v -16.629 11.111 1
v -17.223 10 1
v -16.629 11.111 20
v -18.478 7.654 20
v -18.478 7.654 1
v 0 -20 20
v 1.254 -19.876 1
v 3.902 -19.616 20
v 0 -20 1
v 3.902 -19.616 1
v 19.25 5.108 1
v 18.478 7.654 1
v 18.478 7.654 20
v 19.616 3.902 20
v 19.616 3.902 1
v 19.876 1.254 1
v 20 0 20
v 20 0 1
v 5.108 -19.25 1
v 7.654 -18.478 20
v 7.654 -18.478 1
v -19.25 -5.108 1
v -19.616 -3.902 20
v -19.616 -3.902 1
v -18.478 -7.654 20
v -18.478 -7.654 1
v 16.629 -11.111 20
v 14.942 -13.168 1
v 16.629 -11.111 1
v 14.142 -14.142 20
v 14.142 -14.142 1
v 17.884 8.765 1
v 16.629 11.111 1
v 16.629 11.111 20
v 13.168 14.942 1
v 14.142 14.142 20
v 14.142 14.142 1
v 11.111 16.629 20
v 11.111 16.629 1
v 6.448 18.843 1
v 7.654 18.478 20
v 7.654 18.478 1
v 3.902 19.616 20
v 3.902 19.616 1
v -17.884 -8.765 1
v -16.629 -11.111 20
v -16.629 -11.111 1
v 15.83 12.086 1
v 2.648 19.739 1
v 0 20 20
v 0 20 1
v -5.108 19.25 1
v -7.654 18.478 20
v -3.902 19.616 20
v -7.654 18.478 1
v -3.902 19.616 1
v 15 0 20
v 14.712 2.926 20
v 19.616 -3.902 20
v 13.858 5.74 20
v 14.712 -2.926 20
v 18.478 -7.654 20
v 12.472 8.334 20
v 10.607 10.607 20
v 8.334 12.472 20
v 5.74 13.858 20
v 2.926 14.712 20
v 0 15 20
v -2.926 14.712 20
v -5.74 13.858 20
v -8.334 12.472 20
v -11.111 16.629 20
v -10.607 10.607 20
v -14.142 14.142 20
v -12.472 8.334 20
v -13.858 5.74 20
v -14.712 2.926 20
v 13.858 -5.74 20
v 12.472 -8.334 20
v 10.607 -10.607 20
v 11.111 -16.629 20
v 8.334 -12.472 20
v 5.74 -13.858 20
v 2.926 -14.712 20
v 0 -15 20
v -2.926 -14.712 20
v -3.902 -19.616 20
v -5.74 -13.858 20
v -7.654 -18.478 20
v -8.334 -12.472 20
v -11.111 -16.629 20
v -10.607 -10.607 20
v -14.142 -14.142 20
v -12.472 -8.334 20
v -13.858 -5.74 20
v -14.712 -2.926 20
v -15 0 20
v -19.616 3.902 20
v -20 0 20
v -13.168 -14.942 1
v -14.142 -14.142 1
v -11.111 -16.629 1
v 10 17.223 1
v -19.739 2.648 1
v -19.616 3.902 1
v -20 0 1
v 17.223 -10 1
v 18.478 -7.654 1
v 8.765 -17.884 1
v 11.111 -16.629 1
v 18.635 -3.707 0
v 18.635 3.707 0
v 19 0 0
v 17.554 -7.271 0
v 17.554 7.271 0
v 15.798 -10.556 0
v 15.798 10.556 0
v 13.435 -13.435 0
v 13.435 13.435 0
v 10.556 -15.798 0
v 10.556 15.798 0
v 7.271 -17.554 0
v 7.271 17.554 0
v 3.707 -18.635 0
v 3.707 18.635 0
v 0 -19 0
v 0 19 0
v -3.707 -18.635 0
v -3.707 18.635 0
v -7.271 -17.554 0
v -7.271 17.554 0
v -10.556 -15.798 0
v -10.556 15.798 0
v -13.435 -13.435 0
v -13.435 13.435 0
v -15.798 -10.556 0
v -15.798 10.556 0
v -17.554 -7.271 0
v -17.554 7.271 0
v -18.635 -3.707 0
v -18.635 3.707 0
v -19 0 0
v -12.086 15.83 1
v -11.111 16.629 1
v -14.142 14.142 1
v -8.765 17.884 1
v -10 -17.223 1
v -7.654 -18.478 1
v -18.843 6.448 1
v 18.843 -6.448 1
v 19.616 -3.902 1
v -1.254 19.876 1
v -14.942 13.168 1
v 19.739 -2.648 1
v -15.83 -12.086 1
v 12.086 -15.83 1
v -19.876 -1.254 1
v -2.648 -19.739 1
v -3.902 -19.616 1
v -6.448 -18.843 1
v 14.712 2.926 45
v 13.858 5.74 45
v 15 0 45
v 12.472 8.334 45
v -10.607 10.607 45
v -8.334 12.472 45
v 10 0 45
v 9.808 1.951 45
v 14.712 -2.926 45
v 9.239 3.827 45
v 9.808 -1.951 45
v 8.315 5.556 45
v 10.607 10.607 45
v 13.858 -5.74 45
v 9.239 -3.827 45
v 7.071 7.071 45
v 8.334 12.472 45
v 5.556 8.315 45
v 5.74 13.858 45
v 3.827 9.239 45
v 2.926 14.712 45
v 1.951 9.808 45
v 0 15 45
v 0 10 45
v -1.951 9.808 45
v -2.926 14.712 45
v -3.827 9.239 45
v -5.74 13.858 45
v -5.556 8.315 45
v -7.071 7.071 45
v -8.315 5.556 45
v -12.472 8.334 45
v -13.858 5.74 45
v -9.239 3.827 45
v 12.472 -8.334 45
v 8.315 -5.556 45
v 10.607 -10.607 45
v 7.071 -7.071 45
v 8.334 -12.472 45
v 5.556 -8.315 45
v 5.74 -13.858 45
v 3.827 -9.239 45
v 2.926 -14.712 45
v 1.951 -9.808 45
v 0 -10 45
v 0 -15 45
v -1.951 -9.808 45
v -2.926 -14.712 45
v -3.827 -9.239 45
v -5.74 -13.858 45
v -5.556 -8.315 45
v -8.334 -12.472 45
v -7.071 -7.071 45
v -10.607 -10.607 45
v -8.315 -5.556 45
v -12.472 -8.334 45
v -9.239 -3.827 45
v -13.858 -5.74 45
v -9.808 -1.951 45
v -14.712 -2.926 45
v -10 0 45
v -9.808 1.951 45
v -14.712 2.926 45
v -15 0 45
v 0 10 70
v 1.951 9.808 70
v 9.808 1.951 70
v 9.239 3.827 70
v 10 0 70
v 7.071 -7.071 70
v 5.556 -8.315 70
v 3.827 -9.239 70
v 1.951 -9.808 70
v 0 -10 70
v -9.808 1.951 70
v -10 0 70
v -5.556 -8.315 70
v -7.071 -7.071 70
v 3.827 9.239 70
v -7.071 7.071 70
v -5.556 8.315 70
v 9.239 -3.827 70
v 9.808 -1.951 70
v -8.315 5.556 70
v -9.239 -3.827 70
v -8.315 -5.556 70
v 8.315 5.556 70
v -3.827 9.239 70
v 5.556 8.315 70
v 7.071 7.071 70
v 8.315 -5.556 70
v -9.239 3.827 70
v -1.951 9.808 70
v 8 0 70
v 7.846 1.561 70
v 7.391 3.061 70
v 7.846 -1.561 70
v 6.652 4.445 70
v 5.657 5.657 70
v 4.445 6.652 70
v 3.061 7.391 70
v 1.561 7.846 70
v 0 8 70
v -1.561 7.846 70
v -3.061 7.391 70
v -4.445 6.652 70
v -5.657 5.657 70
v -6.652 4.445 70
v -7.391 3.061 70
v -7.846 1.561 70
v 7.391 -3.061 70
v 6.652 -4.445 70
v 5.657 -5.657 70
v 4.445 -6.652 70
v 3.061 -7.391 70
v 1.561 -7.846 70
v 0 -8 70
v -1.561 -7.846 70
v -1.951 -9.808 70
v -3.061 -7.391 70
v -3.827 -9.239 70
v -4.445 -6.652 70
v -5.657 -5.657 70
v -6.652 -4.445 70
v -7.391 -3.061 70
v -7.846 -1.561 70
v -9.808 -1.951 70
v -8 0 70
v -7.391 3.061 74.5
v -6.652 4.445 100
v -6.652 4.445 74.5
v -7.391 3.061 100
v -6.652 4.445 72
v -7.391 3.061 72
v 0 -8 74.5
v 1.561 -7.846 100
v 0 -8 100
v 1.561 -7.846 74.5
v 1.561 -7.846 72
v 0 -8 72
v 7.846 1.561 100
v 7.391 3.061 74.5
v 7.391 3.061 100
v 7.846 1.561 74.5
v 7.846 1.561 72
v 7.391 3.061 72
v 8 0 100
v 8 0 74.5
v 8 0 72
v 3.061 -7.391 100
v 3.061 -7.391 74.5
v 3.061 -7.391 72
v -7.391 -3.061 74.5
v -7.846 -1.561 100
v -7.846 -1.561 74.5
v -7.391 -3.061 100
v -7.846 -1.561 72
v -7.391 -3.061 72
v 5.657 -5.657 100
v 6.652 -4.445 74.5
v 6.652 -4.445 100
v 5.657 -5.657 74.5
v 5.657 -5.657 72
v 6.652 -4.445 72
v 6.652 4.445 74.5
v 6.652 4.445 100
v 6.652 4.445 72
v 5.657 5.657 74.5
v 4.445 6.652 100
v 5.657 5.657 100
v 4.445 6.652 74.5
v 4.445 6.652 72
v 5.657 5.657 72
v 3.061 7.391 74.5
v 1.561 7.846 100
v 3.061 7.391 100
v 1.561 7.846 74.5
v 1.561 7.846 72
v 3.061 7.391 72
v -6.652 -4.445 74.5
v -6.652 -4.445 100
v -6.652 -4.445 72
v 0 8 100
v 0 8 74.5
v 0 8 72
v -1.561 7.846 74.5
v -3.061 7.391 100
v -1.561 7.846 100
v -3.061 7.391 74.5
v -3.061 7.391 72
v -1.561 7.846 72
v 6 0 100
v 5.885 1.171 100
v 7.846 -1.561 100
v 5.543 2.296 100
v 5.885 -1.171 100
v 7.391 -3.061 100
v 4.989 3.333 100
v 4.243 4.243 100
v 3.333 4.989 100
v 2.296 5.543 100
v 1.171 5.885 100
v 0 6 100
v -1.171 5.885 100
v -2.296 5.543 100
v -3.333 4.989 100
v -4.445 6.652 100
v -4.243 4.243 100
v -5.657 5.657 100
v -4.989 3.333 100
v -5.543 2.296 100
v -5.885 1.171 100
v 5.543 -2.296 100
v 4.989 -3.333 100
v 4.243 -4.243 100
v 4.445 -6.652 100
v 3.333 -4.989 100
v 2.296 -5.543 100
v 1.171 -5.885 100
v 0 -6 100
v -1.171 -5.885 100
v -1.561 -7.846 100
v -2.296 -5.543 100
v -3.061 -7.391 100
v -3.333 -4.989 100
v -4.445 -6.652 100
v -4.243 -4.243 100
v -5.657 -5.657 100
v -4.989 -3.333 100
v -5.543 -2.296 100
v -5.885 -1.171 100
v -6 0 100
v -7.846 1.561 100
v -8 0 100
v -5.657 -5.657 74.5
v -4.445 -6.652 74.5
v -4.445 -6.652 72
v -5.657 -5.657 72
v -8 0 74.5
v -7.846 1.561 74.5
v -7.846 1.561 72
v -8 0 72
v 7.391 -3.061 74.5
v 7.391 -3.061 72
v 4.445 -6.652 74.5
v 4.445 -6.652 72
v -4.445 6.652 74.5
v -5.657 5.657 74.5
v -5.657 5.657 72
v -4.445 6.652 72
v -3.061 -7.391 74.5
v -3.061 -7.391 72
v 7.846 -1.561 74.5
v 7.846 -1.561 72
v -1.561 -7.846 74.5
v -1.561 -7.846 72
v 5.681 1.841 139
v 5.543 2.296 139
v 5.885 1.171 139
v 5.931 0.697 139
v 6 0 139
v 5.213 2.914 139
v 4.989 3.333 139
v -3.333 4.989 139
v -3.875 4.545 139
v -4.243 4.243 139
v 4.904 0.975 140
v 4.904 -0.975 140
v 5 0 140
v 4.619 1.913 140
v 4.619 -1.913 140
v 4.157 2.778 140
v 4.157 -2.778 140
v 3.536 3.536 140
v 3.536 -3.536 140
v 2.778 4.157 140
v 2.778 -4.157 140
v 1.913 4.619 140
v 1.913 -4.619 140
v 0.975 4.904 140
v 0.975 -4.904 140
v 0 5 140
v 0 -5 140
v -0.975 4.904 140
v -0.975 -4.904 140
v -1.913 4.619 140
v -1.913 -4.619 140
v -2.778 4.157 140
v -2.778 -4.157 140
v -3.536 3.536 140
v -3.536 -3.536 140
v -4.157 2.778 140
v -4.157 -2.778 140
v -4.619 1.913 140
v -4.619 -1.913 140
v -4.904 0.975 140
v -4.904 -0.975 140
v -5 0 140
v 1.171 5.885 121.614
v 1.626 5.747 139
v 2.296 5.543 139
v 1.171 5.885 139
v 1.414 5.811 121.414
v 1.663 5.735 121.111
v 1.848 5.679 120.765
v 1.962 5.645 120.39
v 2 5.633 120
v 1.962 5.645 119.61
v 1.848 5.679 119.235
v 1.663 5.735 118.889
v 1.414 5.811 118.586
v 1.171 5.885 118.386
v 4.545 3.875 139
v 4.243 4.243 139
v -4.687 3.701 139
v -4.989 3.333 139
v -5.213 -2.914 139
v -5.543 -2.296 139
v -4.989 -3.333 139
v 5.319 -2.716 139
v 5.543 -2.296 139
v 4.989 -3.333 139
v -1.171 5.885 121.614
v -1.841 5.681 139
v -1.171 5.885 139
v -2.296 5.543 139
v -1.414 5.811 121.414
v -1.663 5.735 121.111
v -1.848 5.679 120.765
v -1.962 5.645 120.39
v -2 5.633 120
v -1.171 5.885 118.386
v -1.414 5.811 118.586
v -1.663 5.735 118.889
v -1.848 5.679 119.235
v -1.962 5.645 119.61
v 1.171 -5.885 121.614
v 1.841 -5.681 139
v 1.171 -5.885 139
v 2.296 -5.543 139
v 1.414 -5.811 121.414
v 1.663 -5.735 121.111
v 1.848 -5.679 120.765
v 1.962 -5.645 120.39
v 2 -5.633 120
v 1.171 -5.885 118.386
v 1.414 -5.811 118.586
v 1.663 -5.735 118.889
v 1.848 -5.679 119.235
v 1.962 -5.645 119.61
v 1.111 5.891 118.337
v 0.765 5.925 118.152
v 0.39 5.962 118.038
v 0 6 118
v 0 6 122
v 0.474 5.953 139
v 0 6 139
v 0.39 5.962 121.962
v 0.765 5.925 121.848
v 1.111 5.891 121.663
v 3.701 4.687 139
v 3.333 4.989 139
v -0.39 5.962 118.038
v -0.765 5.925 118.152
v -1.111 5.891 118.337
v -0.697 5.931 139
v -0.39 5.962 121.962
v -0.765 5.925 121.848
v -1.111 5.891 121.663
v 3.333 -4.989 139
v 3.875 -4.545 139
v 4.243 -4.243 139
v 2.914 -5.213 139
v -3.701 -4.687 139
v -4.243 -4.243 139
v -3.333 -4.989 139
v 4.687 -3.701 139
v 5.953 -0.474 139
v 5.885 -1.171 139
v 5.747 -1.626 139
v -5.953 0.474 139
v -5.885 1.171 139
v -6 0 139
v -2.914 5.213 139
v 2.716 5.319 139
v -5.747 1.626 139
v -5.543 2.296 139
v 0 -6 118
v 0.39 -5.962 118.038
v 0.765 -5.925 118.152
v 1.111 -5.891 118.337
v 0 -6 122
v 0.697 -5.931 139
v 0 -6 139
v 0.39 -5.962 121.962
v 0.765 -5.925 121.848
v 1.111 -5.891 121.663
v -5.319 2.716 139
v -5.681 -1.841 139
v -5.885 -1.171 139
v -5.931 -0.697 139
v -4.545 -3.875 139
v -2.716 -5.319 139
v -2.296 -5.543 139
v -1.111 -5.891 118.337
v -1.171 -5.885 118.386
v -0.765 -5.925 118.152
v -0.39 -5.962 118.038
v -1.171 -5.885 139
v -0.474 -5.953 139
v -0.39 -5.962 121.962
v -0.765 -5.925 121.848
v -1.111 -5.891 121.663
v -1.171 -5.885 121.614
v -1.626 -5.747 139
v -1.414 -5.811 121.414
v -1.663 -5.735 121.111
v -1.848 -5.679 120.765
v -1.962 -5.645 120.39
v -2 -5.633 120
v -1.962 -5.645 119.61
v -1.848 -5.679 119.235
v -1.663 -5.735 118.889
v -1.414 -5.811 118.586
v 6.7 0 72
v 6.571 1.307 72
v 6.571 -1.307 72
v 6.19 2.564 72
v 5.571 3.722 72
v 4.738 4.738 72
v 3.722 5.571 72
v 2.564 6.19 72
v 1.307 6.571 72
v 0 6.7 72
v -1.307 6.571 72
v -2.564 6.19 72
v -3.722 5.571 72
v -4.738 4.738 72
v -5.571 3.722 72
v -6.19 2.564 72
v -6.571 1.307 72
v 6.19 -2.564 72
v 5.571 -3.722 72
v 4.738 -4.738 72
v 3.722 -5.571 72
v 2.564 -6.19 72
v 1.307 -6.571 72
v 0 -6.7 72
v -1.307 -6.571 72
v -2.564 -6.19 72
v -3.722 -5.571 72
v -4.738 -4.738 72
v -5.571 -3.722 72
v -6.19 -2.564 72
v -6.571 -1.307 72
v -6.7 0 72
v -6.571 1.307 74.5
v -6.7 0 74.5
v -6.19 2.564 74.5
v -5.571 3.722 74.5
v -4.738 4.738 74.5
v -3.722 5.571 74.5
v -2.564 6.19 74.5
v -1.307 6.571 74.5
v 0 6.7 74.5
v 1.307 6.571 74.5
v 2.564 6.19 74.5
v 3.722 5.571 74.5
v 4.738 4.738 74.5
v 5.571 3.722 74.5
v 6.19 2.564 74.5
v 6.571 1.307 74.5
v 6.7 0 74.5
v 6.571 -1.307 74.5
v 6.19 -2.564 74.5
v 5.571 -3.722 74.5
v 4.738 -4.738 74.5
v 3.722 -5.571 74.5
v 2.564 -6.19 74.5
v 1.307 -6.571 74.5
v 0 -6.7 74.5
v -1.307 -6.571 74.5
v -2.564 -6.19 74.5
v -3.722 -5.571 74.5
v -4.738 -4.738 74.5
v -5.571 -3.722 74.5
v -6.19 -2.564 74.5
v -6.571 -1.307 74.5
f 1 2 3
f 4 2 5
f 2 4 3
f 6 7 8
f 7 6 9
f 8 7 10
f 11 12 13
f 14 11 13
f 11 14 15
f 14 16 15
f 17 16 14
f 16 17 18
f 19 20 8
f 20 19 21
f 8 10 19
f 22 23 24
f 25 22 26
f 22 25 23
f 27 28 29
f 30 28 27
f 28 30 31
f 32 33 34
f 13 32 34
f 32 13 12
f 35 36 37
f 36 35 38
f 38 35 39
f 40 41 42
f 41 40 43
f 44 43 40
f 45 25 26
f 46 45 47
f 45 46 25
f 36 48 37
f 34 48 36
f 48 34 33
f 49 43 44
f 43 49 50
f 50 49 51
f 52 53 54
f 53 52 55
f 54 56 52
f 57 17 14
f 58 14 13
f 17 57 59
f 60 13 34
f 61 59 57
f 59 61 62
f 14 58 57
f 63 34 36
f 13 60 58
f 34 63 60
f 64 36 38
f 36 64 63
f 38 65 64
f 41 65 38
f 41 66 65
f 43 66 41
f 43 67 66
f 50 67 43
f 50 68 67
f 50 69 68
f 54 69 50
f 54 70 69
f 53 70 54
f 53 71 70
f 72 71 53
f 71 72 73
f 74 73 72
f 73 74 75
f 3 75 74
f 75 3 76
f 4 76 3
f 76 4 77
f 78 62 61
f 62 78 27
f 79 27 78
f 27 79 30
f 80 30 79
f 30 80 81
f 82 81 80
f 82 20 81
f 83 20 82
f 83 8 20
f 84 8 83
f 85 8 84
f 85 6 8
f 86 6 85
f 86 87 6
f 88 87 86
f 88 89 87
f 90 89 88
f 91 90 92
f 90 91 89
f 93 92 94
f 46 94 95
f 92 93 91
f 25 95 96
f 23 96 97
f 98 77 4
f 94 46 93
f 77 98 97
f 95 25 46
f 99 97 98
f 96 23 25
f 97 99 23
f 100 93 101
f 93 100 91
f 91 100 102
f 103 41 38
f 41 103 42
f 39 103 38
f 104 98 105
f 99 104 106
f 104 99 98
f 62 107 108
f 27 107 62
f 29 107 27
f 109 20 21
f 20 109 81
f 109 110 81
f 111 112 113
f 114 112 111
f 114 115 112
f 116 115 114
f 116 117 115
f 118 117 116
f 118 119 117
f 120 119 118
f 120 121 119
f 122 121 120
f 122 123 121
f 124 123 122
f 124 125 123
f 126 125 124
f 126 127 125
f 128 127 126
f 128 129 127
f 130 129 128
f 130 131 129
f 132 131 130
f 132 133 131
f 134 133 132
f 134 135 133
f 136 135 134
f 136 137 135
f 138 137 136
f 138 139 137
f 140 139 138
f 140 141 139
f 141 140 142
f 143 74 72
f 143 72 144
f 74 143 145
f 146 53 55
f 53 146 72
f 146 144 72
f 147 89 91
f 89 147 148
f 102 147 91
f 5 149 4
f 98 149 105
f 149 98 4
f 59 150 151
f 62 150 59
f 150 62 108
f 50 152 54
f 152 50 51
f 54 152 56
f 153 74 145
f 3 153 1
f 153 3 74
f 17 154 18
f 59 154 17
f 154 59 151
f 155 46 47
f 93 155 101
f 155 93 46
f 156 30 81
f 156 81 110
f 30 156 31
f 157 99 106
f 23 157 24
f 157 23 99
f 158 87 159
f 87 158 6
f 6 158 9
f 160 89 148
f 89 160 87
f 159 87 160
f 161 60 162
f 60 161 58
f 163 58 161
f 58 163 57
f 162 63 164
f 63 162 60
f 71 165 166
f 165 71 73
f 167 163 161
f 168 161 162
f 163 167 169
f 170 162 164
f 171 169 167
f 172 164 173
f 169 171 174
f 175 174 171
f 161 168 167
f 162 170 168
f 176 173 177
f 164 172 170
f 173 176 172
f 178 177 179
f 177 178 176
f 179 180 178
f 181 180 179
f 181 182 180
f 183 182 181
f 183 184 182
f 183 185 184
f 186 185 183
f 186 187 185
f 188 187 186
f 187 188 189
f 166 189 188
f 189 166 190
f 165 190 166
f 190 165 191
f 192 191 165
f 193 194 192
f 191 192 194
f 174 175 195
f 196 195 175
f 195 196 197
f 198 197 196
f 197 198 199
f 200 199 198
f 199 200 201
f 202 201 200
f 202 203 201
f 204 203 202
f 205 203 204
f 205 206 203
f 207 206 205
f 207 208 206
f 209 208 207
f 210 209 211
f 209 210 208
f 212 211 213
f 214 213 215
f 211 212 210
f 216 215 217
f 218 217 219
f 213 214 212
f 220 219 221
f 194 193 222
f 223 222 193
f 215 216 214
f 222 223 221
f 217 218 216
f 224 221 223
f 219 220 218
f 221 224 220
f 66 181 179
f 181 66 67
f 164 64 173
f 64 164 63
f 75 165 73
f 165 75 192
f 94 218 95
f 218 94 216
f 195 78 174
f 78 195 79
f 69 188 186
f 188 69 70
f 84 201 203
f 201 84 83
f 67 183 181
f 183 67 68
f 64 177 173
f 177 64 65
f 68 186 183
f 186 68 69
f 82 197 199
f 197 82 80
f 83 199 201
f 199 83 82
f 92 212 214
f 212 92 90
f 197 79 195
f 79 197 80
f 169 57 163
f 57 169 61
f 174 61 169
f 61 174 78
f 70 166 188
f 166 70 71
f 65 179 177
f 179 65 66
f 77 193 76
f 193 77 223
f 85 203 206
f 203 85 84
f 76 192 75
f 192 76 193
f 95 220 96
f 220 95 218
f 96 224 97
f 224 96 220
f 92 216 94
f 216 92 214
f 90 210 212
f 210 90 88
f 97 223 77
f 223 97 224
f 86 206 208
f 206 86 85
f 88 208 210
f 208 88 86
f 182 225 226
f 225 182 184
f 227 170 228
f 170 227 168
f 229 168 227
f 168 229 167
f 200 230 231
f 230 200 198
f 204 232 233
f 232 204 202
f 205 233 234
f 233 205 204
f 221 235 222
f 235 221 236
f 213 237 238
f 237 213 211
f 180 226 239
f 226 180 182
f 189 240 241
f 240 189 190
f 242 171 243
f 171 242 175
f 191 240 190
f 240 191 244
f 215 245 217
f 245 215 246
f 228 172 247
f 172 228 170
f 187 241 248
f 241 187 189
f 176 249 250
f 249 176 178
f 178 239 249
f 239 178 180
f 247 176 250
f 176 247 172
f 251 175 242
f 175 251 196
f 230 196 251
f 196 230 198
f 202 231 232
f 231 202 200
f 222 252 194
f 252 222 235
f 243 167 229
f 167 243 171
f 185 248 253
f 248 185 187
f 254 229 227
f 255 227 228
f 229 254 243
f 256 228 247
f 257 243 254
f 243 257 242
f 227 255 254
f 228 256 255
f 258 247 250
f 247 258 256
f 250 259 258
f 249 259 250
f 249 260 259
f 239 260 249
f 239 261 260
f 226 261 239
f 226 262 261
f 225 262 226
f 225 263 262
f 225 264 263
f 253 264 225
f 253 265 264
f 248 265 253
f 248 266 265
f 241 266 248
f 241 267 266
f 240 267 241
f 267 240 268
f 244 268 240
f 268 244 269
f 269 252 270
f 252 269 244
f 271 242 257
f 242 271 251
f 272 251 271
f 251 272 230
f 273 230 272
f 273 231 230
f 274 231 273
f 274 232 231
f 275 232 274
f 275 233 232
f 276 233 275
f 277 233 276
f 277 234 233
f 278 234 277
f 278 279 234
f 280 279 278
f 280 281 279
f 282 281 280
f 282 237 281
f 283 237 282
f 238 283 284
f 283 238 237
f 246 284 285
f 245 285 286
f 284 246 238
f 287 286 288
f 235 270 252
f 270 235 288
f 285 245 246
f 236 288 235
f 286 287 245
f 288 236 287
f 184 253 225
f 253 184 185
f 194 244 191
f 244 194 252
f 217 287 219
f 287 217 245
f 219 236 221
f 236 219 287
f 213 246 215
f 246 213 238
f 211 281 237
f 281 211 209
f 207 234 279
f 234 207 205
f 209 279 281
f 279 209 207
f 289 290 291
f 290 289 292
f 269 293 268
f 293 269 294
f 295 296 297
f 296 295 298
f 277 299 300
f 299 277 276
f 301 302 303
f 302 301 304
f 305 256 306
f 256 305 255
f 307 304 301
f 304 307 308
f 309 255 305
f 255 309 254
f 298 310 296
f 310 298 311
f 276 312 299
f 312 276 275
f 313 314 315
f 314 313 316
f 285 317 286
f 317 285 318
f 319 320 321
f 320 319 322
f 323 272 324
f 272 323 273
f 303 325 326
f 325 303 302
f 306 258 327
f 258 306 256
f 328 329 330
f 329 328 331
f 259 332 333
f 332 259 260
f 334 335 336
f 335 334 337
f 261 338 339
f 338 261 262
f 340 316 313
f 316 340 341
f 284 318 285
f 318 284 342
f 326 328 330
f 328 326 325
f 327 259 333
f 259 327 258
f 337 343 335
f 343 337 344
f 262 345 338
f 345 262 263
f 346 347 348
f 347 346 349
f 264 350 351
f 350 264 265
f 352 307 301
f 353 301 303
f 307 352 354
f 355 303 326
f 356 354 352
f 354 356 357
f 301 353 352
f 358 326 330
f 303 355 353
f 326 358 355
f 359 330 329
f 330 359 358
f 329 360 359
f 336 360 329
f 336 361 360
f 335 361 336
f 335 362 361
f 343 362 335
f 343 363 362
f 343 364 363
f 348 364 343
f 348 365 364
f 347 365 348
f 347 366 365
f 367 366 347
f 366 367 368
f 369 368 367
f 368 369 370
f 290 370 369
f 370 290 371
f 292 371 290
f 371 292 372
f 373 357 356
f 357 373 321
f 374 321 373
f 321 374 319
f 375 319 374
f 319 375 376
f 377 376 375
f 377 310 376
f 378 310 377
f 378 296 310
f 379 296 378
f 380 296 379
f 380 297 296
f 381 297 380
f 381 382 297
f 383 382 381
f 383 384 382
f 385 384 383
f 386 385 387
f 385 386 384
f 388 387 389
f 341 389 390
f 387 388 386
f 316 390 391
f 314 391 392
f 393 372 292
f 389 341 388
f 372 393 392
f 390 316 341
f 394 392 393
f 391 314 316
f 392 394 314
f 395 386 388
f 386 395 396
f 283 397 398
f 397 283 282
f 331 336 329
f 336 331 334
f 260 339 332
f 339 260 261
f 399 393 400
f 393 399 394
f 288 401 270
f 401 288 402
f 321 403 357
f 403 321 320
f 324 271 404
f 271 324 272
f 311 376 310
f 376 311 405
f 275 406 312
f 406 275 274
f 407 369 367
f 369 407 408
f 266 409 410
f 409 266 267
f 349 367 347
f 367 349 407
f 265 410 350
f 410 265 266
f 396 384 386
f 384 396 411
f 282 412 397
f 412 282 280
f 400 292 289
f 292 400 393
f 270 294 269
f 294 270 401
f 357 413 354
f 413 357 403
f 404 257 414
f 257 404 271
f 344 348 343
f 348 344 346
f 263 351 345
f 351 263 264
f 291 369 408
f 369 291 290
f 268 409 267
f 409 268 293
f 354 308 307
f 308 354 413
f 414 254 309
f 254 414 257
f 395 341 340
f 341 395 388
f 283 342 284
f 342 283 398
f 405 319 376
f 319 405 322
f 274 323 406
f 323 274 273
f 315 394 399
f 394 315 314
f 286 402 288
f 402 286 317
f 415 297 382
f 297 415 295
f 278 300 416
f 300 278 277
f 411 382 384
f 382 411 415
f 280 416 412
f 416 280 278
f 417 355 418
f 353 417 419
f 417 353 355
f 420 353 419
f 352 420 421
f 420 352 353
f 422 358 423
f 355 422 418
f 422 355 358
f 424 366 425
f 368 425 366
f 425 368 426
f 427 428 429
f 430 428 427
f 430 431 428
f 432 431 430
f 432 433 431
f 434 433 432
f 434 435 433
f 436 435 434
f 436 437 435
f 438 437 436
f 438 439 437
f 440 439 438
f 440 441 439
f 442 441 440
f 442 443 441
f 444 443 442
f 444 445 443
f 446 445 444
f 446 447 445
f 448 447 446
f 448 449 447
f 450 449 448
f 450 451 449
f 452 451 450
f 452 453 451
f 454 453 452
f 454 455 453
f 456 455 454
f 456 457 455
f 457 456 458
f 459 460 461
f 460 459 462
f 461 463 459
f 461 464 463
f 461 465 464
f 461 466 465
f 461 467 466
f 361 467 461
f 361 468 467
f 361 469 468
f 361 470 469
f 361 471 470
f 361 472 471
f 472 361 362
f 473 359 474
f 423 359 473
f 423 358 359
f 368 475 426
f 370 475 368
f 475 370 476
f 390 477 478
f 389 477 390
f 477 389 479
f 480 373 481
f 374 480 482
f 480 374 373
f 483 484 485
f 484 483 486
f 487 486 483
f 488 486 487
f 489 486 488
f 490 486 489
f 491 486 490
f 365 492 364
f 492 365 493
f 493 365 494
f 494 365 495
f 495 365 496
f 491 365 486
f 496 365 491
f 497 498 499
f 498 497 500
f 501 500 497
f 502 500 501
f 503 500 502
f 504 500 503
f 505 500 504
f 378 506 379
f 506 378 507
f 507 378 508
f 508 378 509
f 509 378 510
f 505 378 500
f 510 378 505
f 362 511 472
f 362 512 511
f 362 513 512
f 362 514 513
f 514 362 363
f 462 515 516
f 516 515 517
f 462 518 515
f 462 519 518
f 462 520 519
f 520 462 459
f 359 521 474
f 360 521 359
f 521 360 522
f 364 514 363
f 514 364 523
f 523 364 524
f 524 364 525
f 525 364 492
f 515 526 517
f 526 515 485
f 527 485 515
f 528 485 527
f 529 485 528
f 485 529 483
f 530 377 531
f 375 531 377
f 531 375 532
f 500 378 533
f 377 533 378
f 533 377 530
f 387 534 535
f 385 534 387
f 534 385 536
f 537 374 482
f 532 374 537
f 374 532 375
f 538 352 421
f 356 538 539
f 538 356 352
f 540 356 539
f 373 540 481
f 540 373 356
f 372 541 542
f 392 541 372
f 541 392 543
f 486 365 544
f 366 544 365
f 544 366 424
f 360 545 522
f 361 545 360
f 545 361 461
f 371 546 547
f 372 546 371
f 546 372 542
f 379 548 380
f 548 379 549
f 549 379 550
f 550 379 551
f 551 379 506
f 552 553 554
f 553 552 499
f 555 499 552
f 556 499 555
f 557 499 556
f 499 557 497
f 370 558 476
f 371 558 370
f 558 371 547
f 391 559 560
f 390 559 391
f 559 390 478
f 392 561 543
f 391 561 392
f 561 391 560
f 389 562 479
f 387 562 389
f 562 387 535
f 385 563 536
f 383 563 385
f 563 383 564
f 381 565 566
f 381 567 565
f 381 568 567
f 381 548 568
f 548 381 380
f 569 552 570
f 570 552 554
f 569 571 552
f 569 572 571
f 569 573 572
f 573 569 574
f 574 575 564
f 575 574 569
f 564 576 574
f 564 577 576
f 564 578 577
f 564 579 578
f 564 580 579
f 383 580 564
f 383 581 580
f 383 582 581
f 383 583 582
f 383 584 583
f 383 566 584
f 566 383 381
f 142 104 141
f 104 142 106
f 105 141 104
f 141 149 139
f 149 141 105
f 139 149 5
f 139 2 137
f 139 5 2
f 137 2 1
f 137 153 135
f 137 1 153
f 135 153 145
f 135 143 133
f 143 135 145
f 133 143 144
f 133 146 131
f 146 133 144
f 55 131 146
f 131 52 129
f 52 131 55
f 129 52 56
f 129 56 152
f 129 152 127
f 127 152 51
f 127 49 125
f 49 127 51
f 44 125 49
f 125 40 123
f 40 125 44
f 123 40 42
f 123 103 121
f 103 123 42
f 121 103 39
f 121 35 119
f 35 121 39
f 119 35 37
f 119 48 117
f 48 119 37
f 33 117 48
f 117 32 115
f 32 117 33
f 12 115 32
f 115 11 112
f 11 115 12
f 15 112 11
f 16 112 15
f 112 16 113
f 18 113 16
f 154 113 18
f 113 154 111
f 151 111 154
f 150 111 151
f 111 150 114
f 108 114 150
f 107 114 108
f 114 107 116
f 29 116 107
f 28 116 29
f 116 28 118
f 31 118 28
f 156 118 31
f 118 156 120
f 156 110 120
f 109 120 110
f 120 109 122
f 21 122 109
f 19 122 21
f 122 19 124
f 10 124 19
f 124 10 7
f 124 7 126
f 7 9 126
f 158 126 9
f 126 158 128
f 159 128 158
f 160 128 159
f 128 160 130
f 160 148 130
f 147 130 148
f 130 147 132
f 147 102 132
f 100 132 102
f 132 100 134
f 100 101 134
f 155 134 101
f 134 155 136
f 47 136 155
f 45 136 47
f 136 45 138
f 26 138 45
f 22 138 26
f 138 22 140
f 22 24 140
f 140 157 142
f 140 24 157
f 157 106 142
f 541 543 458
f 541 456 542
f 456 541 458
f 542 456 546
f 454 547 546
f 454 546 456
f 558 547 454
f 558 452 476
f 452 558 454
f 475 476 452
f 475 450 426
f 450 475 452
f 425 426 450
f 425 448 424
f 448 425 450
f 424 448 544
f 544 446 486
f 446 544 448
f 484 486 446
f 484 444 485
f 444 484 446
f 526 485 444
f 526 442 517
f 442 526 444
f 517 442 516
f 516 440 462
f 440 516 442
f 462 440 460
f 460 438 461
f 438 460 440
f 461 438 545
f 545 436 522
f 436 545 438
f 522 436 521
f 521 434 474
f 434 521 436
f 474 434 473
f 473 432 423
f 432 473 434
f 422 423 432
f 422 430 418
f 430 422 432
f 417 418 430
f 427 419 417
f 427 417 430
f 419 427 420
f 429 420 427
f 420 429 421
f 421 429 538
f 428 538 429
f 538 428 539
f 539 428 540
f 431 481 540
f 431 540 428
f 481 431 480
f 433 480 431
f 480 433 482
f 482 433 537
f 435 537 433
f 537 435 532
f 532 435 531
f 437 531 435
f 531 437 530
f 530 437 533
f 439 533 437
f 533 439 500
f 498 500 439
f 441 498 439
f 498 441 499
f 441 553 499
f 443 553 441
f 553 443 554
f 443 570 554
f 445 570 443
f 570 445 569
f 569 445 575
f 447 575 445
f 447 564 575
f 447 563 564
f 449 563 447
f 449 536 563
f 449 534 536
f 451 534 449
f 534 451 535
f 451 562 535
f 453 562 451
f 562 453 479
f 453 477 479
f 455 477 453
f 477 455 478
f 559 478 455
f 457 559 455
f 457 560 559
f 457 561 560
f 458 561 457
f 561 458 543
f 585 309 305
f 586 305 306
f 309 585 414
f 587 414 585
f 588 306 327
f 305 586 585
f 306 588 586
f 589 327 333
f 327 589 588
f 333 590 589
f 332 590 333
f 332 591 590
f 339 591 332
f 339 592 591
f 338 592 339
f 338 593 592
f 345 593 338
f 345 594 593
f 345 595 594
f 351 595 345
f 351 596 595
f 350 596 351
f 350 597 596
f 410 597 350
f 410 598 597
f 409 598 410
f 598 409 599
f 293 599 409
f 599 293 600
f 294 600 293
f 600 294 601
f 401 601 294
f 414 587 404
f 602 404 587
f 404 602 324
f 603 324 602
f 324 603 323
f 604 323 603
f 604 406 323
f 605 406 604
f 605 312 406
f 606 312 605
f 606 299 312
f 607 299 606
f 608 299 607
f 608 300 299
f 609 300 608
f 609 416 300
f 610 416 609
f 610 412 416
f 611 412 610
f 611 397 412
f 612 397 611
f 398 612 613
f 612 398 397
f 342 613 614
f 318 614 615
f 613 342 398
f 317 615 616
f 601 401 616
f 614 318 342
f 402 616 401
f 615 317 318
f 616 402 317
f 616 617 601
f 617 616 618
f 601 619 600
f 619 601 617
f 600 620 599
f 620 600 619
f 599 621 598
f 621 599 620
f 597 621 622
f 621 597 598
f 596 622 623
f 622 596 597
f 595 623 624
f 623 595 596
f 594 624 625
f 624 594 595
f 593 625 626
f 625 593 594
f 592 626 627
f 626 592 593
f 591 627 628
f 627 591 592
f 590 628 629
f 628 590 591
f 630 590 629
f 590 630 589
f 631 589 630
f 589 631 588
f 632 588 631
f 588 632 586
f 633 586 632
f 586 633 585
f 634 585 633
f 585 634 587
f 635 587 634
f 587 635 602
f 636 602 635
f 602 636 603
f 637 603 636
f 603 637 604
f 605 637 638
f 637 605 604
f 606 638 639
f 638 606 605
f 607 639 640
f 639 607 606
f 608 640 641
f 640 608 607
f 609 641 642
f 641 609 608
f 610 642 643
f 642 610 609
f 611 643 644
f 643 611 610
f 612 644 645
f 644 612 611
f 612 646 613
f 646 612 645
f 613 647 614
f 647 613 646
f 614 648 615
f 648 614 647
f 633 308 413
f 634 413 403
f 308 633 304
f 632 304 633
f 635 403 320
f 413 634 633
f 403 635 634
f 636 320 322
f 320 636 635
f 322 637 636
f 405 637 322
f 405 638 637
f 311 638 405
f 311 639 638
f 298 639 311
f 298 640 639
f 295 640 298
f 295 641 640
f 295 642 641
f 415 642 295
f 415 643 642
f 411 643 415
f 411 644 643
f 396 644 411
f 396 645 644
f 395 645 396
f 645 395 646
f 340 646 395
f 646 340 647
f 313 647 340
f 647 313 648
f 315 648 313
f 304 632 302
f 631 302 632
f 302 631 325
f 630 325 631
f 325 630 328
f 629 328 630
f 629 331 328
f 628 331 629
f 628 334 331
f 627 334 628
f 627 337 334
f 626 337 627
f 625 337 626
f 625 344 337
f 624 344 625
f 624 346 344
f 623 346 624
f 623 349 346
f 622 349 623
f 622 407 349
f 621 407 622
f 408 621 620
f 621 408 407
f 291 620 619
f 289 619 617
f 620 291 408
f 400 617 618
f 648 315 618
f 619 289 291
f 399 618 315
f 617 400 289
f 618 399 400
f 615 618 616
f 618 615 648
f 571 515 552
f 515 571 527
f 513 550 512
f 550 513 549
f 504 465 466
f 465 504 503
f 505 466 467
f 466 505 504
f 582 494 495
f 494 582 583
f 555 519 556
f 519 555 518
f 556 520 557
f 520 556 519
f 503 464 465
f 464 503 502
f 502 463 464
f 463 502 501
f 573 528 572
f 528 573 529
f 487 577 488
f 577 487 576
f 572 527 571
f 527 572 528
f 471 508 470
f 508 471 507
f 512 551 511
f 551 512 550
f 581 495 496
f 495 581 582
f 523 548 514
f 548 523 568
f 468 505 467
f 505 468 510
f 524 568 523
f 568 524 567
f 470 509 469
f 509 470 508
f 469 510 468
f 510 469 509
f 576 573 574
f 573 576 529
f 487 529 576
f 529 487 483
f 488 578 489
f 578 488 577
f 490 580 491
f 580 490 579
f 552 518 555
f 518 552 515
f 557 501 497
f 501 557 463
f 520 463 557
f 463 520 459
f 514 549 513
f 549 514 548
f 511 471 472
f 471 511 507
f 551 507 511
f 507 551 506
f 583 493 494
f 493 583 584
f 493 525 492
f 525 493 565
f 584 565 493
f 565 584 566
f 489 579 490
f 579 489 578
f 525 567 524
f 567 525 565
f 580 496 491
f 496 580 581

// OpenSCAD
$fn = 32;

// ----------------------------------------------------------------------
// Stepped shaft: diameters 40, 30, 20, 16, 12 mm, 140 mm long
// ----------------------------------------------------------------------

// --- parameters (mm) ---
d1 = 40;                  // step 1 diameter
len1 = 20;                // step 1 length
d2 = 30;                  // step 2 diameter
len2 = 25;                // step 2 length
d3 = 20;                  // step 3 diameter
len3 = 25;                // step 3 length
d4 = 16;                  // step 4 diameter
len4 = 30;                // step 4 length
d5 = 12;                  // step 5 diameter
len5 = 40;                // step 5 length
total = 140;              // overall length
chamfer = 1;              // end chamfer
groove_r = 8;             // groove radius
groove_z = 72;            // groove position from the end
groove_w = 2.5;           // groove width
groove_d = 1.3;           // groove depth
cross_d = 4;              // cross pin hole
cross_z = 120;            // cross hole position

difference() {
  /* turned body: stacked cylinders, every step sunk into the bigger one */
  union() {
    cylinder(h = len1, d = d1);
    translate([0, 0, 19.6]) cylinder(h = 25.4, d = d2);
    translate([0, 0, 44.6]) cylinder(h = 25.4, d = d3);
    translate([0, 0, 69.6]) cylinder(h = 30.4, d = d4);
    translate([0, 0, 99.6]) cylinder(h = 40.4, d = d5);
  }
  /* bottom chamfer ring cut */
  rotate_extrude() translate([19, -2.5]) polygon([[0, 0], [3.5, 0], [3.5, 6], [0, 2.5]]);
  /* top chamfer ring cut */
  rotate_extrude() translate([5, 140]) polygon([[0, 0], [3.5, -3.5], [3.5, 2.5], [0, 2.5]]);
  /* circlip groove just behind the shoulder */
  rotate_extrude() translate([groove_r - groove_d, groove_z]) square([groove_d + 2.5, groove_w]);
  /* cross pin hole through the small step */
  translate([0, 0, cross_z]) rotate([90, 0, 0]) cylinder(h = d5 + 5, d = cross_d, center = true);
}
